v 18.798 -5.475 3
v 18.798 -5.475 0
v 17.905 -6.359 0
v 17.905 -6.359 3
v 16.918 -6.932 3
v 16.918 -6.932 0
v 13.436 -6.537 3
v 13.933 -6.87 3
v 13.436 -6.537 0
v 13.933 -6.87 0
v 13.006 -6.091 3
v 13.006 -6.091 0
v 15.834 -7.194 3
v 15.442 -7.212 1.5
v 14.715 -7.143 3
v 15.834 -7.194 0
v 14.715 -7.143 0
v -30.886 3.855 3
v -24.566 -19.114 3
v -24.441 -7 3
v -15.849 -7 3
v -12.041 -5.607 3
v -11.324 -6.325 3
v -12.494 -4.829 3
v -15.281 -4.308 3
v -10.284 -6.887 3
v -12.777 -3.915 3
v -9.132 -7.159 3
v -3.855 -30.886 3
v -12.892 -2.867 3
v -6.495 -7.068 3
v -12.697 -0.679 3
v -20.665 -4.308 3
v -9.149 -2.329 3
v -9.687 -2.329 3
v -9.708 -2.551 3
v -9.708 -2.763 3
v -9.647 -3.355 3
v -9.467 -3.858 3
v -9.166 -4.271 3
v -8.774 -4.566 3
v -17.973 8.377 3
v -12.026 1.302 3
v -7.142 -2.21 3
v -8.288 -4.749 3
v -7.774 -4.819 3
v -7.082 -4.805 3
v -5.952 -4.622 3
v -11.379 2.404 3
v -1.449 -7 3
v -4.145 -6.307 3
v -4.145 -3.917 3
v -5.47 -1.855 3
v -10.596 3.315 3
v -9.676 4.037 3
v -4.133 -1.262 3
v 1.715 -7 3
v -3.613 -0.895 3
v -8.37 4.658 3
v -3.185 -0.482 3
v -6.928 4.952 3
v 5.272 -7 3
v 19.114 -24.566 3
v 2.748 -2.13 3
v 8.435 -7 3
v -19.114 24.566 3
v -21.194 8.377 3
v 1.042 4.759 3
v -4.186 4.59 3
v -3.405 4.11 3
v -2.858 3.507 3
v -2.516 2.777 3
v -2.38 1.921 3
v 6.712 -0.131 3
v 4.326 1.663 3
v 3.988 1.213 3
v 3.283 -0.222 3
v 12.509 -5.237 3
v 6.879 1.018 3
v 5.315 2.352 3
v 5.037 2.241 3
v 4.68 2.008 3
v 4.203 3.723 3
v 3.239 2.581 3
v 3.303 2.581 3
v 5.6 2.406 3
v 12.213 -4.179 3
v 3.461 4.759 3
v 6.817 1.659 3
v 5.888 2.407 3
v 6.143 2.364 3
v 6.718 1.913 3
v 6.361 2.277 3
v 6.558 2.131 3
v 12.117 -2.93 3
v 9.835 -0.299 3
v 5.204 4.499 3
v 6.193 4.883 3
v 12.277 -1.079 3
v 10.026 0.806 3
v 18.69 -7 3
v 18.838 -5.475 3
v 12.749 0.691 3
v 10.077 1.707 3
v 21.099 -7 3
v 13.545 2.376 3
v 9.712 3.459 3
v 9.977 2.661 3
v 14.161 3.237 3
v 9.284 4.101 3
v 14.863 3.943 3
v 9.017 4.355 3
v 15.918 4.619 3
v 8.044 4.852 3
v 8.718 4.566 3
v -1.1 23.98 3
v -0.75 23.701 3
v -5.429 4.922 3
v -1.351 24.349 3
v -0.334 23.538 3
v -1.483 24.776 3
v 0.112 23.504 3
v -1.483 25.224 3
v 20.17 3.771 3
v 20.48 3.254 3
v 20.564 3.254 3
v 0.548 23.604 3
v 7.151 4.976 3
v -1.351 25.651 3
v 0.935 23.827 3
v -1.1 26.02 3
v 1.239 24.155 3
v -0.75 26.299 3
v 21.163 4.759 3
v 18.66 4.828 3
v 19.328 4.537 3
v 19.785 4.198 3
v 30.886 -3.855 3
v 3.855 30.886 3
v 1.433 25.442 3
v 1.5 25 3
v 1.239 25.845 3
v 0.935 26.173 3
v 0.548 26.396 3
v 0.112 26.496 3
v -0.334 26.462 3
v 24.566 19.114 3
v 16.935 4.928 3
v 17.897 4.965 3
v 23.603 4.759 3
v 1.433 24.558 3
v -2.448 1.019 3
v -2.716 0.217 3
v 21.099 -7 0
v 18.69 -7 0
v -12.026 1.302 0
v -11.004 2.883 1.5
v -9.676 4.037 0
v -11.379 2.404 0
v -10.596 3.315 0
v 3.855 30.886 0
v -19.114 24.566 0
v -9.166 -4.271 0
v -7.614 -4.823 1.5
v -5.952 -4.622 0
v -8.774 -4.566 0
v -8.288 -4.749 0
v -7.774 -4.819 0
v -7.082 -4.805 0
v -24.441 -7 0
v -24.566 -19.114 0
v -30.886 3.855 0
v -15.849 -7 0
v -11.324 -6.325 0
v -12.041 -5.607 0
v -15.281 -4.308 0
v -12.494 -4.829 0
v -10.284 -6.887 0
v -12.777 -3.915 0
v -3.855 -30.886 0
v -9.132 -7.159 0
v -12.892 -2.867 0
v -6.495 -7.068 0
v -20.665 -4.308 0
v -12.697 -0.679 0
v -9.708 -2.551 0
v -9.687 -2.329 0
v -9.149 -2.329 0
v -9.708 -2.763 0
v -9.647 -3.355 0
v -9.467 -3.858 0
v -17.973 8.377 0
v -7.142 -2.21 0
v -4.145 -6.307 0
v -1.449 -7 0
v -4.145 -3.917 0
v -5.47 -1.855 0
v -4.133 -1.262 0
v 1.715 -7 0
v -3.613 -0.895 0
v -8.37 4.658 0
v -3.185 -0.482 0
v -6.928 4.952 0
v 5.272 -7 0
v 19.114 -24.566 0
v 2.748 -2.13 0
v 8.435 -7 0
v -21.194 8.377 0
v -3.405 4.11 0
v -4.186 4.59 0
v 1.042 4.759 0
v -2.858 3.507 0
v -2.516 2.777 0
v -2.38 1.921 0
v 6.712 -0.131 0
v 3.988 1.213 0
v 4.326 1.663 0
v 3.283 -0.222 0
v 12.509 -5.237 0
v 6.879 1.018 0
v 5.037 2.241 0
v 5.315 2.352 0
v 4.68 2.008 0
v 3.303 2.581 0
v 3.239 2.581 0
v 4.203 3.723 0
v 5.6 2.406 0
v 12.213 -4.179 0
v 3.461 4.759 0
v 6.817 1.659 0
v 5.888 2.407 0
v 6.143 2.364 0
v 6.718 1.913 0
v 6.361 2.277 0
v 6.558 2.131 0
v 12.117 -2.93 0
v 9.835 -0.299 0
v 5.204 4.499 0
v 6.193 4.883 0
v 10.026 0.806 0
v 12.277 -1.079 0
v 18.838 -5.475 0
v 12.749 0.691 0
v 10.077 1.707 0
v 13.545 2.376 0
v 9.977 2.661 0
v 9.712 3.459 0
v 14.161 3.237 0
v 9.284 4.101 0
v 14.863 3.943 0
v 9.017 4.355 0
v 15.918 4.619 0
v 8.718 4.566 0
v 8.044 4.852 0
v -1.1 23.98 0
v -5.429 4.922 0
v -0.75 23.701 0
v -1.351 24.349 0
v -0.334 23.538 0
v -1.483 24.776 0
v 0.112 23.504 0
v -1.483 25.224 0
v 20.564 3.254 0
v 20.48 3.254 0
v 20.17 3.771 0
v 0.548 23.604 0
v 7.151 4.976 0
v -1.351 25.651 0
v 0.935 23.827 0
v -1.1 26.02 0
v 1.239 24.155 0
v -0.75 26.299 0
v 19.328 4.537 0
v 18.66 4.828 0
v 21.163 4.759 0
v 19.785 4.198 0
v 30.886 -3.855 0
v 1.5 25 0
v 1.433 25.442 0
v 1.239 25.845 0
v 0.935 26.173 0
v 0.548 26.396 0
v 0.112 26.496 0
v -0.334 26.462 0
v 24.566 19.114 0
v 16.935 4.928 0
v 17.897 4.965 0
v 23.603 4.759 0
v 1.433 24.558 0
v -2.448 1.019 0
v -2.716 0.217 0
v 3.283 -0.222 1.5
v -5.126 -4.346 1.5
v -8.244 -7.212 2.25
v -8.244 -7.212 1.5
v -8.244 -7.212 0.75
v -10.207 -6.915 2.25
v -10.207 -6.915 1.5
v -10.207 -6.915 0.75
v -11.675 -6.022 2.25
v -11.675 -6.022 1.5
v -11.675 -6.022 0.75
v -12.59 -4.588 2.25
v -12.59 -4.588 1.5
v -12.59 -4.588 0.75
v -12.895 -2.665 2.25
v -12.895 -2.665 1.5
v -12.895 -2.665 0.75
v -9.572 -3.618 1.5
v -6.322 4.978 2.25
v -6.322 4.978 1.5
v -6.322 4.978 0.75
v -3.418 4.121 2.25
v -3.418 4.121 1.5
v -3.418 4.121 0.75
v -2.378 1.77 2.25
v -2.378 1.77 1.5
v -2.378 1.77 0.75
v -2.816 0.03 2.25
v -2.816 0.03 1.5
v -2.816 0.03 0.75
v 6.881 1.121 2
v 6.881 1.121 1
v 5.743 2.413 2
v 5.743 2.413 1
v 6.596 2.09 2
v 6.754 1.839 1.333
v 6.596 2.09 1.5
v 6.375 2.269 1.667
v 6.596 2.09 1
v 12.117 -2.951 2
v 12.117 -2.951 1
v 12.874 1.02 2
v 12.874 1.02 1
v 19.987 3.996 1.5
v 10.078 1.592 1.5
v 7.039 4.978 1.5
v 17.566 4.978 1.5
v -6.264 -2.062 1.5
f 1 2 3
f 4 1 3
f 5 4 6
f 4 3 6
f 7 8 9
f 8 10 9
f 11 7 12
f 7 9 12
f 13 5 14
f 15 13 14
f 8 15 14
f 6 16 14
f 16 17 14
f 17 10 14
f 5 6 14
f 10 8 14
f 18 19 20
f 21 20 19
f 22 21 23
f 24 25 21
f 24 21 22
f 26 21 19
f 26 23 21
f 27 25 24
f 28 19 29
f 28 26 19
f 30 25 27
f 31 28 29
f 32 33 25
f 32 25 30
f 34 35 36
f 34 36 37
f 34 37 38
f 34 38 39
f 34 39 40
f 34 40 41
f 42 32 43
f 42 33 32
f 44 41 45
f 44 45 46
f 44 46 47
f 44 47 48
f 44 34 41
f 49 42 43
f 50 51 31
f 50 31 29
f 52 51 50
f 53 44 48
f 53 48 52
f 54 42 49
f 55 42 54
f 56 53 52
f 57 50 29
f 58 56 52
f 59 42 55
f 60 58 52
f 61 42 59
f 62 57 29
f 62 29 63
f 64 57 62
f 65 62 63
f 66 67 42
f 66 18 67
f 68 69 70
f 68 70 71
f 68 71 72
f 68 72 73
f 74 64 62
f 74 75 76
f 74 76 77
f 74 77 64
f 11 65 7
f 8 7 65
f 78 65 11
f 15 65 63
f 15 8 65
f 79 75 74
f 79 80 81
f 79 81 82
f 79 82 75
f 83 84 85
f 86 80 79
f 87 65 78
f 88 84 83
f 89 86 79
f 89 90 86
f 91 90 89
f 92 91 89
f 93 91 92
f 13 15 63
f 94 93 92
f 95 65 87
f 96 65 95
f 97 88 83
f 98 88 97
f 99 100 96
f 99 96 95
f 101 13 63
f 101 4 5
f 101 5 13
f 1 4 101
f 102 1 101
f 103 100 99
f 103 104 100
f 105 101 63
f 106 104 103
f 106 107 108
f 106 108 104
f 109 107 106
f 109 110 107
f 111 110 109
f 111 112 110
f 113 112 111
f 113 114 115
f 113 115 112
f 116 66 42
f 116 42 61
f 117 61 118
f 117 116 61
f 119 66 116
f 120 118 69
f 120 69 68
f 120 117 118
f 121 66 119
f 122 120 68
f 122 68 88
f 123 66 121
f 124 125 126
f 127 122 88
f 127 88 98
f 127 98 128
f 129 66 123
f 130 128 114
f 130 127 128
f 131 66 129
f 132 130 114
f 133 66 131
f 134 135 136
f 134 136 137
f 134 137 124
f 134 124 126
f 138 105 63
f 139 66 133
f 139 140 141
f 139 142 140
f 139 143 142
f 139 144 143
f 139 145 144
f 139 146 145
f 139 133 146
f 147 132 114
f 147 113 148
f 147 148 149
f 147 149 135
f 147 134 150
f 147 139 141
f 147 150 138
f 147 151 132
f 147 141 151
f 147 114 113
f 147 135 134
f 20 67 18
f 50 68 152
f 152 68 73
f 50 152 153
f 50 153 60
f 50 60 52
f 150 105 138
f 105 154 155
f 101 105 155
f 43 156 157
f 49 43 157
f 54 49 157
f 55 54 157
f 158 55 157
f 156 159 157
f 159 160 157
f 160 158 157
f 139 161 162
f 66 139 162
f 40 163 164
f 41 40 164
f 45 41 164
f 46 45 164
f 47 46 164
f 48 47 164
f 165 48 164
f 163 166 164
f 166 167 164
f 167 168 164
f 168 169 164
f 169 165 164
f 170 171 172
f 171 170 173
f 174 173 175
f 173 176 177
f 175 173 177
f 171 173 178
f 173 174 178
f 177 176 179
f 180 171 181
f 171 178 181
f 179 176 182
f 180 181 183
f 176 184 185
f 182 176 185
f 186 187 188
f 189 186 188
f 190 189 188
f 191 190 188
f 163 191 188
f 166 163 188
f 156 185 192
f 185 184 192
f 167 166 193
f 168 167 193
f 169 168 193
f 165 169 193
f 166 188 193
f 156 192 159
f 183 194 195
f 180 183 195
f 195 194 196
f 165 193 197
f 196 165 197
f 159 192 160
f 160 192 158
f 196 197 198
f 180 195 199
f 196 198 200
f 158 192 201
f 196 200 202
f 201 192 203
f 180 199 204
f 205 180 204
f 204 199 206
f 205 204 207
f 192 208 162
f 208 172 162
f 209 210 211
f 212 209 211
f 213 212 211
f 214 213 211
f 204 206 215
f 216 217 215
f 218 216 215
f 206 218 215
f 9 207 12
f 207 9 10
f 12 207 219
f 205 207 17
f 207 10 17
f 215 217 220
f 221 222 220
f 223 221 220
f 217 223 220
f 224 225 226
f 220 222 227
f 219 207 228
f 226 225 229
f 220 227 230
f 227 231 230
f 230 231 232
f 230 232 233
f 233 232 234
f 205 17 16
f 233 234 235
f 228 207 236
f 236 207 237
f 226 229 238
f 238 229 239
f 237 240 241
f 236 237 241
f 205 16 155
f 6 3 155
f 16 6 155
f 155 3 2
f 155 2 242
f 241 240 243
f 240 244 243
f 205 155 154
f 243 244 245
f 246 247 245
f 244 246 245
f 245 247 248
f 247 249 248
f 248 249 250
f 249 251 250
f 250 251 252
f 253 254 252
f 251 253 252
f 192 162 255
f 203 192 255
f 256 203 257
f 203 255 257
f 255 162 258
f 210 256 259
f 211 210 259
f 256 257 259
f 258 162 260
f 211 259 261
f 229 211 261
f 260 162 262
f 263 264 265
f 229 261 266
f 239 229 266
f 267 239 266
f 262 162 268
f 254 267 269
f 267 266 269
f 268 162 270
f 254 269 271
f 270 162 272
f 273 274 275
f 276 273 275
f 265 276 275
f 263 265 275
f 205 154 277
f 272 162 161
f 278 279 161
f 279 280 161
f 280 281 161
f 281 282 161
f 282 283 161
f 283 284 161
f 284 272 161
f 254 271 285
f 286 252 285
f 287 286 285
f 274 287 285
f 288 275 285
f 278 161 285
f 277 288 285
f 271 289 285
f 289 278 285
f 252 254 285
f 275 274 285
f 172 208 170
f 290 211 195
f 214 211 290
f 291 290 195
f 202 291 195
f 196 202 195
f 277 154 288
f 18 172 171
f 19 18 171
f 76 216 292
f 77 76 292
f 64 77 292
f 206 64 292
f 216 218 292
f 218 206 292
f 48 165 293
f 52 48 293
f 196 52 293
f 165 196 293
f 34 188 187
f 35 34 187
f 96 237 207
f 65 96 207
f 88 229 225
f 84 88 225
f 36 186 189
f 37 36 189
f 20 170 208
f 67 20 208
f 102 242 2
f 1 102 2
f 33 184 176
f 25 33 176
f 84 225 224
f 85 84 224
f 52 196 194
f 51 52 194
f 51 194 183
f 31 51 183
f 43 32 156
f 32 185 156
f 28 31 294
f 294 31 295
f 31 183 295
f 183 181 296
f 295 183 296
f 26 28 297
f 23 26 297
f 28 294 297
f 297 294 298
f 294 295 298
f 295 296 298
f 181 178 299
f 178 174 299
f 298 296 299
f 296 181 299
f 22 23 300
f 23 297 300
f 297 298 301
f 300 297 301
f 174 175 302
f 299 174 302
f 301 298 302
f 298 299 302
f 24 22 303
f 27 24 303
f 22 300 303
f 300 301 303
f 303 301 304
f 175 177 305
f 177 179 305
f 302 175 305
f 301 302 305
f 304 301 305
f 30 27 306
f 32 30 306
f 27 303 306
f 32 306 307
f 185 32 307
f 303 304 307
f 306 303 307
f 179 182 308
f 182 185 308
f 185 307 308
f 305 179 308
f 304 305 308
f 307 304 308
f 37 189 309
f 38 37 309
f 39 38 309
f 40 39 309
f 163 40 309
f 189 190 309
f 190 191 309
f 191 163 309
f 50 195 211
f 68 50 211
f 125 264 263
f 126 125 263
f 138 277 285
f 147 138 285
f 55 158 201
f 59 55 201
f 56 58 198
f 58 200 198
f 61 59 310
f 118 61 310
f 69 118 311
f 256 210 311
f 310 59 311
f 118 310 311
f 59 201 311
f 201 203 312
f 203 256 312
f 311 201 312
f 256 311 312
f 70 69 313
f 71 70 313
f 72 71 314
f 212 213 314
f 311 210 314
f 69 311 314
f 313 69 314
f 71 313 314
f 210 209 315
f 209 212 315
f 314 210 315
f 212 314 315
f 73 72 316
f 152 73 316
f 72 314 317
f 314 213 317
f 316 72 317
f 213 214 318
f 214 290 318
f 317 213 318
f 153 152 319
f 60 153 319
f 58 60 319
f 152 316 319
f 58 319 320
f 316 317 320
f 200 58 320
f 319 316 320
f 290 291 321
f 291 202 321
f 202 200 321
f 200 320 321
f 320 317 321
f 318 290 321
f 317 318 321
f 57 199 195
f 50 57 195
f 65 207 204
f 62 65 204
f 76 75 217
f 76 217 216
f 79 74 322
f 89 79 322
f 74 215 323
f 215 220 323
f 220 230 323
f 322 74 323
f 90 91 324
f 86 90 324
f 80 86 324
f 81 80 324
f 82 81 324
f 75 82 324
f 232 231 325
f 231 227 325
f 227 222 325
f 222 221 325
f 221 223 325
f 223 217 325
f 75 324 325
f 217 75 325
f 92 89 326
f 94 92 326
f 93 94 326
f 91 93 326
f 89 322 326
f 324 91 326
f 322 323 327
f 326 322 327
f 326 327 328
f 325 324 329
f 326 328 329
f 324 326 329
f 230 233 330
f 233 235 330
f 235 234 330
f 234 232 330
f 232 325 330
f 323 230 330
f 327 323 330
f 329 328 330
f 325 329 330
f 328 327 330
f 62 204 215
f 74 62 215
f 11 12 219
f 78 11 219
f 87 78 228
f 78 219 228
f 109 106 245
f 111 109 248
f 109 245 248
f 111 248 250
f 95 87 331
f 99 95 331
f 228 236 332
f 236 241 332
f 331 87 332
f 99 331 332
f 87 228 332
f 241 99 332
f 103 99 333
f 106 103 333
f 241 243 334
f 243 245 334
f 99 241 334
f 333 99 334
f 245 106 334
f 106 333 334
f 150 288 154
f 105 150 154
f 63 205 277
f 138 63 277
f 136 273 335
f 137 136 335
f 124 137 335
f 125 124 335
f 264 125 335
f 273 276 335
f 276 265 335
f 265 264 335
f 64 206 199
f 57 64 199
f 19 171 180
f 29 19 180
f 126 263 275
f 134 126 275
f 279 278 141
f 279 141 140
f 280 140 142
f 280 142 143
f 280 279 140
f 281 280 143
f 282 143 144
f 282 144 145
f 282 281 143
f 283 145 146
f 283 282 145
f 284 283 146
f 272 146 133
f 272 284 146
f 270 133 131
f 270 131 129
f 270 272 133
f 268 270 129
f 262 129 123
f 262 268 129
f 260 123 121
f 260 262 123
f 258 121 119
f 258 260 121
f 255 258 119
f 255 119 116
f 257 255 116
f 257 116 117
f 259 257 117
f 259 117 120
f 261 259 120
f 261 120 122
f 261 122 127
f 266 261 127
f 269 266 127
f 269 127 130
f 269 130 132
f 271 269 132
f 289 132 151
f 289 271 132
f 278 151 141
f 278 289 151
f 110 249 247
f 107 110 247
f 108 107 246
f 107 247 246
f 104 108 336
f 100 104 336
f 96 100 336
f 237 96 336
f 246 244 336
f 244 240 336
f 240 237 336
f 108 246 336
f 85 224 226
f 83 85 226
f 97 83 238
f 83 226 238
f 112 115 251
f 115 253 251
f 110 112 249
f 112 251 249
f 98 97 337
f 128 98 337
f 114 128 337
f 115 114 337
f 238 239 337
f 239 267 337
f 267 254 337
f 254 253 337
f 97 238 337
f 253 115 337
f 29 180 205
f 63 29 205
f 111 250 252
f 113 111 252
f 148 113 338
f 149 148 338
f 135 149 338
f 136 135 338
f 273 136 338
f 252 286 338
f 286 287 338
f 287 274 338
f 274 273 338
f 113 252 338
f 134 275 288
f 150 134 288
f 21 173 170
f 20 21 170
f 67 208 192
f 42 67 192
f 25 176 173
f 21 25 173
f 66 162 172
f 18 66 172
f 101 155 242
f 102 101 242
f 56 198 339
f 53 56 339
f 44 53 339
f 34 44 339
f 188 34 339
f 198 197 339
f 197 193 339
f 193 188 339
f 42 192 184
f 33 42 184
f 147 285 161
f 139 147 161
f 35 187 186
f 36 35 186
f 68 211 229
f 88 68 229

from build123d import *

# Parameters (mm, degrees)
F1_R     = 1.5
F2_DEPTH = 3


with BuildPart() as f2:
    # F1 (on Top) → F2 (new body)
    with BuildSketch(Plane.XY):
        Polygon((19.1138070579, -24.5658658908), (30.8861929421, -3.8551877721), (24.5658658908, 19.1138070579), (3.8551877721, 30.8861929421), (-19.1138070579, 24.5658658908), (-30.8861929421, 3.8551877721), (-24.5658658908, -19.1138070579), (-3.8551877721, -30.8861929421), align=None)
        with BuildLine():
            add(Edge.make_bspline(
                [(-4.1445110049, -6.3067241031), (-5.9517399206, -7.2120212694), (-8.2435888807, -7.2120212694)],
                knots=[0, 0, 0, 1, 1, 1], degree=2))
            add(Edge.make_bspline(
                [(-8.2435888807, -7.2120212694), (-10.4546678333, -7.2120212694), (-11.6746314868, -6.0223463687)],
                knots=[0, 0, 0, 1, 1, 1], degree=2))
            add(Edge.make_bspline(
                [(-11.6746314868, -6.0223463687), (-12.8945951403, -4.832671468), (-12.8945951403, -2.665342936)],
                knots=[0, 0, 0, 1, 1, 1], degree=2))
            add(Edge.make_bspline(
                [(-12.8945951403, -2.665342936), (-12.8945951403, -0.49128357), (-12.0263175607, 1.3024836777)],
                knots=[0, 0, 0, 1, 1, 1], degree=2))
            add(Edge.make_bspline(
                [(-12.0263175607, 1.3024836777), (-11.1580399812, 3.0962509255), (-9.6755738036, 4.03688497)],
                knots=[0, 0, 0, 1, 1, 1], degree=2))
            add(Edge.make_bspline(
                [(-9.6755738036, 4.03688497), (-8.193107626, 4.9775190146), (-6.3219357878, 4.9775190146)],
                knots=[0, 0, 0, 1, 1, 1], degree=2))
            add(Edge.make_bspline(
                [(-6.3219357878, 4.9775190146), (-4.4574947836, 4.9775190146), (-3.4175809383, 4.1210203944)],
                knots=[0, 0, 0, 1, 1, 1], degree=2))
            add(Edge.make_bspline(
                [(-3.4175809383, 4.1210203944), (-2.377667093, 3.2645217742), (-2.377667093, 1.7702766373)],
                knots=[0, 0, 0, 1, 1, 1], degree=2))
            add(Edge.make_bspline(
                [(-2.377667093, 1.7702766373), (-2.377667093, -0.1951268762), (-4.1327320455, -1.2619640573)],
                knots=[0, 0, 0, 1, 1, 1], degree=2))
            add(Edge.make_bspline(
                [(-4.1327320455, -1.2619640573), (-5.887796998, -2.3288012385), (-9.148886047, -2.3288012385)],
                knots=[0, 0, 0, 1, 1, 1], degree=2))
            Line((-9.148886047, -2.3288012385), (-9.687352763, -2.3288012385))
            Line((-9.687352763, -2.3288012385), (-9.7075452649, -2.5509187588))
            Line((-9.7075452649, -2.5509187588), (-9.7075452649, -2.7629400283))
            add(Edge.make_bspline(
                [(-9.7075452649, -2.7629400283), (-9.7075452649, -3.7187184492), (-9.1657131319, -4.2706468331)],
                knots=[0, 0, 0, 1, 1, 1], degree=2))
            add(Edge.make_bspline(
                [(-9.1657131319, -4.2706468331), (-8.6238809989, -4.8225752171), (-7.6142559063, -4.8225752171)],
                knots=[0, 0, 0, 1, 1, 1], degree=2))
            add(Edge.make_bspline(
                [(-7.6142559063, -4.8225752171), (-6.6988624891, -4.8225752171), (-5.9517399206, -4.622332907)],
                knots=[0, 0, 0, 1, 1, 1], degree=2))
            add(Edge.make_bspline(
                [(-5.9517399206, -4.622332907), (-5.2046173521, -4.422090597), (-4.1445110049, -3.9172780508)],
                knots=[0, 0, 0, 1, 1, 1], degree=2))
            Line((-4.1445110049, -3.9172780508), (-4.1445110049, -6.3067241031))
        make_face(mode=Mode.SUBTRACT)
        with BuildLine():
            Line((9.8354311099, -0.2994548025), (8.4354176482, -7))
            Line((8.4354176482, -7), (5.2719256916, -7))
            Line((5.2719256916, -7), (6.712324157, -0.1311839537))
            add(Edge.make_bspline(
                [(6.712324157, -0.1311839537), (6.8805950057, 0.582284445), (6.8805950057, 1.1207511611)],
                knots=[0, 0, 0, 1, 1, 1], degree=2))
            add(Edge.make_bspline(
                [(6.8805950057, 1.1207511611), (6.8805950057, 2.4130712795), (5.7430840681, 2.4130712795)],
                knots=[0, 0, 0, 1, 1, 1], degree=2))
            add(Edge.make_bspline(
                [(5.7430840681, 2.4130712795), (4.7772093962, 2.4130712795), (3.9880191156, 1.2133001279)],
                knots=[0, 0, 0, 1, 1, 1], degree=2))
            add(Edge.make_bspline(
                [(3.9880191156, 1.2133001279), (3.1988288349, 0.0135289762), (2.7478629602, -2.1302416369)],
                knots=[0, 0, 0, 1, 1, 1], degree=2))
            Line((2.7478629602, -2.1302416369), (1.7146799488, -7))
            Line((1.7146799488, -7), (-1.4488120078, -7))
            Line((-1.4488120078, -7), (1.0415965538, 4.7587669112))
            Line((1.0415965538, 4.7587669112), (3.461331359, 4.7587669112))
            Line((3.461331359, 4.7587669112), (3.2392138386, 2.5813421283))
            Line((3.2392138386, 2.5813421283), (3.3031567611, 2.5813421283))
            add(Edge.make_bspline(
                [(3.3031567611, 2.5813421283), (4.8377869018, 4.9775190146), (7.0387696036, 4.9775190146)],
                knots=[0, 0, 0, 1, 1, 1], degree=2))
            add(Edge.make_bspline(
                [(7.0387696036, 4.9775190146), (8.4892643198, 4.9775190146), (9.283502726, 4.1008278926)],
                knots=[0, 0, 0, 1, 1, 1], degree=2))
            add(Edge.make_bspline(
                [(9.283502726, 4.1008278926), (10.0777411321, 3.2241367705), (10.0777411321, 1.5919095376)],
                knots=[0, 0, 0, 1, 1, 1], degree=2))
            add(Edge.make_bspline(
                [(10.0777411321, 1.5919095376), (10.0777411321, 0.8245944673), (9.8354311099, -0.2994548025)],
                knots=[0, 0, 0, 1, 1, 1], degree=2))
        make_face(mode=Mode.SUBTRACT)
        with BuildLine():
            add(Edge.make_bspline(
                [(18.7975365148, -5.4754661103), (17.3874268022, -7.2120212694), (15.4422157905, -7.2120212694)],
                knots=[0, 0, 0, 1, 1, 1], degree=2))
            add(Edge.make_bspline(
                [(15.4422157905, -7.2120212694), (13.894123982, -7.2120212694), (13.0056539005, -6.0913374167)],
                knots=[0, 0, 0, 1, 1, 1], degree=2))
            add(Edge.make_bspline(
                [(13.0056539005, -6.0913374167), (12.1171838191, -4.970653564), (12.1171838191, -2.9514033789)],
                knots=[0, 0, 0, 1, 1, 1], degree=2))
            add(Edge.make_bspline(
                [(12.1171838191, -2.9514033789), (12.1171838191, -0.8682102713), (12.8744026385, 1.0197886518)],
                knots=[0, 0, 0, 1, 1, 1], degree=2))
            add(Edge.make_bspline(
                [(12.8744026385, 1.0197886518), (13.6316214579, 2.9077875749), (14.8633640708, 3.9426532947)],
                knots=[0, 0, 0, 1, 1, 1], degree=2))
            add(Edge.make_bspline(
                [(14.8633640708, 3.9426532947), (16.0951066837, 4.9775190146), (17.5657939019, 4.9775190146)],
                knots=[0, 0, 0, 1, 1, 1], degree=2))
            add(Edge.make_bspline(
                [(17.5657939019, 4.9775190146), (18.5855152453, 4.9775190146), (19.3275896884, 4.5366493909)],
                knots=[0, 0, 0, 1, 1, 1], degree=2))
            add(Edge.make_bspline(
                [(19.3275896884, 4.5366493909), (20.0696641314, 4.0957797671), (20.4802450024, 3.2544255233)],
                knots=[0, 0, 0, 1, 1, 1], degree=2))
            Line((20.4802450024, 3.2544255233), (20.5643804267, 3.2544255233))
            Line((20.5643804267, 3.2544255233), (21.1634246483, 4.7587669112))
            Line((21.1634246483, 4.7587669112), (23.6033519553, 4.7587669112))
            Line((23.6033519553, 4.7587669112), (21.0994817258, -7))
            Line((21.0994817258, -7), (18.6898431716, -7))
            Line((18.6898431716, -7), (18.8379215185, -5.4754661103))
            Line((18.8379215185, -5.4754661103), (18.7975365148, -5.4754661103))
        make_face(mode=Mode.SUBTRACT)
        Polygon((-15.8494312445, -7), (-24.4413407821, -7), (-21.1937134011, 8.3765901595), (-17.9730093559, 8.3765901595), (-20.665342936, -4.3076664199), (-15.2806757757, -4.3076664199), align=None, mode=Mode.SUBTRACT)
        with Locations((0, 25)):
            Circle(F1_R, mode=Mode.SUBTRACT)
    extrude(amount=F2_DEPTH)


solid = f2.part
